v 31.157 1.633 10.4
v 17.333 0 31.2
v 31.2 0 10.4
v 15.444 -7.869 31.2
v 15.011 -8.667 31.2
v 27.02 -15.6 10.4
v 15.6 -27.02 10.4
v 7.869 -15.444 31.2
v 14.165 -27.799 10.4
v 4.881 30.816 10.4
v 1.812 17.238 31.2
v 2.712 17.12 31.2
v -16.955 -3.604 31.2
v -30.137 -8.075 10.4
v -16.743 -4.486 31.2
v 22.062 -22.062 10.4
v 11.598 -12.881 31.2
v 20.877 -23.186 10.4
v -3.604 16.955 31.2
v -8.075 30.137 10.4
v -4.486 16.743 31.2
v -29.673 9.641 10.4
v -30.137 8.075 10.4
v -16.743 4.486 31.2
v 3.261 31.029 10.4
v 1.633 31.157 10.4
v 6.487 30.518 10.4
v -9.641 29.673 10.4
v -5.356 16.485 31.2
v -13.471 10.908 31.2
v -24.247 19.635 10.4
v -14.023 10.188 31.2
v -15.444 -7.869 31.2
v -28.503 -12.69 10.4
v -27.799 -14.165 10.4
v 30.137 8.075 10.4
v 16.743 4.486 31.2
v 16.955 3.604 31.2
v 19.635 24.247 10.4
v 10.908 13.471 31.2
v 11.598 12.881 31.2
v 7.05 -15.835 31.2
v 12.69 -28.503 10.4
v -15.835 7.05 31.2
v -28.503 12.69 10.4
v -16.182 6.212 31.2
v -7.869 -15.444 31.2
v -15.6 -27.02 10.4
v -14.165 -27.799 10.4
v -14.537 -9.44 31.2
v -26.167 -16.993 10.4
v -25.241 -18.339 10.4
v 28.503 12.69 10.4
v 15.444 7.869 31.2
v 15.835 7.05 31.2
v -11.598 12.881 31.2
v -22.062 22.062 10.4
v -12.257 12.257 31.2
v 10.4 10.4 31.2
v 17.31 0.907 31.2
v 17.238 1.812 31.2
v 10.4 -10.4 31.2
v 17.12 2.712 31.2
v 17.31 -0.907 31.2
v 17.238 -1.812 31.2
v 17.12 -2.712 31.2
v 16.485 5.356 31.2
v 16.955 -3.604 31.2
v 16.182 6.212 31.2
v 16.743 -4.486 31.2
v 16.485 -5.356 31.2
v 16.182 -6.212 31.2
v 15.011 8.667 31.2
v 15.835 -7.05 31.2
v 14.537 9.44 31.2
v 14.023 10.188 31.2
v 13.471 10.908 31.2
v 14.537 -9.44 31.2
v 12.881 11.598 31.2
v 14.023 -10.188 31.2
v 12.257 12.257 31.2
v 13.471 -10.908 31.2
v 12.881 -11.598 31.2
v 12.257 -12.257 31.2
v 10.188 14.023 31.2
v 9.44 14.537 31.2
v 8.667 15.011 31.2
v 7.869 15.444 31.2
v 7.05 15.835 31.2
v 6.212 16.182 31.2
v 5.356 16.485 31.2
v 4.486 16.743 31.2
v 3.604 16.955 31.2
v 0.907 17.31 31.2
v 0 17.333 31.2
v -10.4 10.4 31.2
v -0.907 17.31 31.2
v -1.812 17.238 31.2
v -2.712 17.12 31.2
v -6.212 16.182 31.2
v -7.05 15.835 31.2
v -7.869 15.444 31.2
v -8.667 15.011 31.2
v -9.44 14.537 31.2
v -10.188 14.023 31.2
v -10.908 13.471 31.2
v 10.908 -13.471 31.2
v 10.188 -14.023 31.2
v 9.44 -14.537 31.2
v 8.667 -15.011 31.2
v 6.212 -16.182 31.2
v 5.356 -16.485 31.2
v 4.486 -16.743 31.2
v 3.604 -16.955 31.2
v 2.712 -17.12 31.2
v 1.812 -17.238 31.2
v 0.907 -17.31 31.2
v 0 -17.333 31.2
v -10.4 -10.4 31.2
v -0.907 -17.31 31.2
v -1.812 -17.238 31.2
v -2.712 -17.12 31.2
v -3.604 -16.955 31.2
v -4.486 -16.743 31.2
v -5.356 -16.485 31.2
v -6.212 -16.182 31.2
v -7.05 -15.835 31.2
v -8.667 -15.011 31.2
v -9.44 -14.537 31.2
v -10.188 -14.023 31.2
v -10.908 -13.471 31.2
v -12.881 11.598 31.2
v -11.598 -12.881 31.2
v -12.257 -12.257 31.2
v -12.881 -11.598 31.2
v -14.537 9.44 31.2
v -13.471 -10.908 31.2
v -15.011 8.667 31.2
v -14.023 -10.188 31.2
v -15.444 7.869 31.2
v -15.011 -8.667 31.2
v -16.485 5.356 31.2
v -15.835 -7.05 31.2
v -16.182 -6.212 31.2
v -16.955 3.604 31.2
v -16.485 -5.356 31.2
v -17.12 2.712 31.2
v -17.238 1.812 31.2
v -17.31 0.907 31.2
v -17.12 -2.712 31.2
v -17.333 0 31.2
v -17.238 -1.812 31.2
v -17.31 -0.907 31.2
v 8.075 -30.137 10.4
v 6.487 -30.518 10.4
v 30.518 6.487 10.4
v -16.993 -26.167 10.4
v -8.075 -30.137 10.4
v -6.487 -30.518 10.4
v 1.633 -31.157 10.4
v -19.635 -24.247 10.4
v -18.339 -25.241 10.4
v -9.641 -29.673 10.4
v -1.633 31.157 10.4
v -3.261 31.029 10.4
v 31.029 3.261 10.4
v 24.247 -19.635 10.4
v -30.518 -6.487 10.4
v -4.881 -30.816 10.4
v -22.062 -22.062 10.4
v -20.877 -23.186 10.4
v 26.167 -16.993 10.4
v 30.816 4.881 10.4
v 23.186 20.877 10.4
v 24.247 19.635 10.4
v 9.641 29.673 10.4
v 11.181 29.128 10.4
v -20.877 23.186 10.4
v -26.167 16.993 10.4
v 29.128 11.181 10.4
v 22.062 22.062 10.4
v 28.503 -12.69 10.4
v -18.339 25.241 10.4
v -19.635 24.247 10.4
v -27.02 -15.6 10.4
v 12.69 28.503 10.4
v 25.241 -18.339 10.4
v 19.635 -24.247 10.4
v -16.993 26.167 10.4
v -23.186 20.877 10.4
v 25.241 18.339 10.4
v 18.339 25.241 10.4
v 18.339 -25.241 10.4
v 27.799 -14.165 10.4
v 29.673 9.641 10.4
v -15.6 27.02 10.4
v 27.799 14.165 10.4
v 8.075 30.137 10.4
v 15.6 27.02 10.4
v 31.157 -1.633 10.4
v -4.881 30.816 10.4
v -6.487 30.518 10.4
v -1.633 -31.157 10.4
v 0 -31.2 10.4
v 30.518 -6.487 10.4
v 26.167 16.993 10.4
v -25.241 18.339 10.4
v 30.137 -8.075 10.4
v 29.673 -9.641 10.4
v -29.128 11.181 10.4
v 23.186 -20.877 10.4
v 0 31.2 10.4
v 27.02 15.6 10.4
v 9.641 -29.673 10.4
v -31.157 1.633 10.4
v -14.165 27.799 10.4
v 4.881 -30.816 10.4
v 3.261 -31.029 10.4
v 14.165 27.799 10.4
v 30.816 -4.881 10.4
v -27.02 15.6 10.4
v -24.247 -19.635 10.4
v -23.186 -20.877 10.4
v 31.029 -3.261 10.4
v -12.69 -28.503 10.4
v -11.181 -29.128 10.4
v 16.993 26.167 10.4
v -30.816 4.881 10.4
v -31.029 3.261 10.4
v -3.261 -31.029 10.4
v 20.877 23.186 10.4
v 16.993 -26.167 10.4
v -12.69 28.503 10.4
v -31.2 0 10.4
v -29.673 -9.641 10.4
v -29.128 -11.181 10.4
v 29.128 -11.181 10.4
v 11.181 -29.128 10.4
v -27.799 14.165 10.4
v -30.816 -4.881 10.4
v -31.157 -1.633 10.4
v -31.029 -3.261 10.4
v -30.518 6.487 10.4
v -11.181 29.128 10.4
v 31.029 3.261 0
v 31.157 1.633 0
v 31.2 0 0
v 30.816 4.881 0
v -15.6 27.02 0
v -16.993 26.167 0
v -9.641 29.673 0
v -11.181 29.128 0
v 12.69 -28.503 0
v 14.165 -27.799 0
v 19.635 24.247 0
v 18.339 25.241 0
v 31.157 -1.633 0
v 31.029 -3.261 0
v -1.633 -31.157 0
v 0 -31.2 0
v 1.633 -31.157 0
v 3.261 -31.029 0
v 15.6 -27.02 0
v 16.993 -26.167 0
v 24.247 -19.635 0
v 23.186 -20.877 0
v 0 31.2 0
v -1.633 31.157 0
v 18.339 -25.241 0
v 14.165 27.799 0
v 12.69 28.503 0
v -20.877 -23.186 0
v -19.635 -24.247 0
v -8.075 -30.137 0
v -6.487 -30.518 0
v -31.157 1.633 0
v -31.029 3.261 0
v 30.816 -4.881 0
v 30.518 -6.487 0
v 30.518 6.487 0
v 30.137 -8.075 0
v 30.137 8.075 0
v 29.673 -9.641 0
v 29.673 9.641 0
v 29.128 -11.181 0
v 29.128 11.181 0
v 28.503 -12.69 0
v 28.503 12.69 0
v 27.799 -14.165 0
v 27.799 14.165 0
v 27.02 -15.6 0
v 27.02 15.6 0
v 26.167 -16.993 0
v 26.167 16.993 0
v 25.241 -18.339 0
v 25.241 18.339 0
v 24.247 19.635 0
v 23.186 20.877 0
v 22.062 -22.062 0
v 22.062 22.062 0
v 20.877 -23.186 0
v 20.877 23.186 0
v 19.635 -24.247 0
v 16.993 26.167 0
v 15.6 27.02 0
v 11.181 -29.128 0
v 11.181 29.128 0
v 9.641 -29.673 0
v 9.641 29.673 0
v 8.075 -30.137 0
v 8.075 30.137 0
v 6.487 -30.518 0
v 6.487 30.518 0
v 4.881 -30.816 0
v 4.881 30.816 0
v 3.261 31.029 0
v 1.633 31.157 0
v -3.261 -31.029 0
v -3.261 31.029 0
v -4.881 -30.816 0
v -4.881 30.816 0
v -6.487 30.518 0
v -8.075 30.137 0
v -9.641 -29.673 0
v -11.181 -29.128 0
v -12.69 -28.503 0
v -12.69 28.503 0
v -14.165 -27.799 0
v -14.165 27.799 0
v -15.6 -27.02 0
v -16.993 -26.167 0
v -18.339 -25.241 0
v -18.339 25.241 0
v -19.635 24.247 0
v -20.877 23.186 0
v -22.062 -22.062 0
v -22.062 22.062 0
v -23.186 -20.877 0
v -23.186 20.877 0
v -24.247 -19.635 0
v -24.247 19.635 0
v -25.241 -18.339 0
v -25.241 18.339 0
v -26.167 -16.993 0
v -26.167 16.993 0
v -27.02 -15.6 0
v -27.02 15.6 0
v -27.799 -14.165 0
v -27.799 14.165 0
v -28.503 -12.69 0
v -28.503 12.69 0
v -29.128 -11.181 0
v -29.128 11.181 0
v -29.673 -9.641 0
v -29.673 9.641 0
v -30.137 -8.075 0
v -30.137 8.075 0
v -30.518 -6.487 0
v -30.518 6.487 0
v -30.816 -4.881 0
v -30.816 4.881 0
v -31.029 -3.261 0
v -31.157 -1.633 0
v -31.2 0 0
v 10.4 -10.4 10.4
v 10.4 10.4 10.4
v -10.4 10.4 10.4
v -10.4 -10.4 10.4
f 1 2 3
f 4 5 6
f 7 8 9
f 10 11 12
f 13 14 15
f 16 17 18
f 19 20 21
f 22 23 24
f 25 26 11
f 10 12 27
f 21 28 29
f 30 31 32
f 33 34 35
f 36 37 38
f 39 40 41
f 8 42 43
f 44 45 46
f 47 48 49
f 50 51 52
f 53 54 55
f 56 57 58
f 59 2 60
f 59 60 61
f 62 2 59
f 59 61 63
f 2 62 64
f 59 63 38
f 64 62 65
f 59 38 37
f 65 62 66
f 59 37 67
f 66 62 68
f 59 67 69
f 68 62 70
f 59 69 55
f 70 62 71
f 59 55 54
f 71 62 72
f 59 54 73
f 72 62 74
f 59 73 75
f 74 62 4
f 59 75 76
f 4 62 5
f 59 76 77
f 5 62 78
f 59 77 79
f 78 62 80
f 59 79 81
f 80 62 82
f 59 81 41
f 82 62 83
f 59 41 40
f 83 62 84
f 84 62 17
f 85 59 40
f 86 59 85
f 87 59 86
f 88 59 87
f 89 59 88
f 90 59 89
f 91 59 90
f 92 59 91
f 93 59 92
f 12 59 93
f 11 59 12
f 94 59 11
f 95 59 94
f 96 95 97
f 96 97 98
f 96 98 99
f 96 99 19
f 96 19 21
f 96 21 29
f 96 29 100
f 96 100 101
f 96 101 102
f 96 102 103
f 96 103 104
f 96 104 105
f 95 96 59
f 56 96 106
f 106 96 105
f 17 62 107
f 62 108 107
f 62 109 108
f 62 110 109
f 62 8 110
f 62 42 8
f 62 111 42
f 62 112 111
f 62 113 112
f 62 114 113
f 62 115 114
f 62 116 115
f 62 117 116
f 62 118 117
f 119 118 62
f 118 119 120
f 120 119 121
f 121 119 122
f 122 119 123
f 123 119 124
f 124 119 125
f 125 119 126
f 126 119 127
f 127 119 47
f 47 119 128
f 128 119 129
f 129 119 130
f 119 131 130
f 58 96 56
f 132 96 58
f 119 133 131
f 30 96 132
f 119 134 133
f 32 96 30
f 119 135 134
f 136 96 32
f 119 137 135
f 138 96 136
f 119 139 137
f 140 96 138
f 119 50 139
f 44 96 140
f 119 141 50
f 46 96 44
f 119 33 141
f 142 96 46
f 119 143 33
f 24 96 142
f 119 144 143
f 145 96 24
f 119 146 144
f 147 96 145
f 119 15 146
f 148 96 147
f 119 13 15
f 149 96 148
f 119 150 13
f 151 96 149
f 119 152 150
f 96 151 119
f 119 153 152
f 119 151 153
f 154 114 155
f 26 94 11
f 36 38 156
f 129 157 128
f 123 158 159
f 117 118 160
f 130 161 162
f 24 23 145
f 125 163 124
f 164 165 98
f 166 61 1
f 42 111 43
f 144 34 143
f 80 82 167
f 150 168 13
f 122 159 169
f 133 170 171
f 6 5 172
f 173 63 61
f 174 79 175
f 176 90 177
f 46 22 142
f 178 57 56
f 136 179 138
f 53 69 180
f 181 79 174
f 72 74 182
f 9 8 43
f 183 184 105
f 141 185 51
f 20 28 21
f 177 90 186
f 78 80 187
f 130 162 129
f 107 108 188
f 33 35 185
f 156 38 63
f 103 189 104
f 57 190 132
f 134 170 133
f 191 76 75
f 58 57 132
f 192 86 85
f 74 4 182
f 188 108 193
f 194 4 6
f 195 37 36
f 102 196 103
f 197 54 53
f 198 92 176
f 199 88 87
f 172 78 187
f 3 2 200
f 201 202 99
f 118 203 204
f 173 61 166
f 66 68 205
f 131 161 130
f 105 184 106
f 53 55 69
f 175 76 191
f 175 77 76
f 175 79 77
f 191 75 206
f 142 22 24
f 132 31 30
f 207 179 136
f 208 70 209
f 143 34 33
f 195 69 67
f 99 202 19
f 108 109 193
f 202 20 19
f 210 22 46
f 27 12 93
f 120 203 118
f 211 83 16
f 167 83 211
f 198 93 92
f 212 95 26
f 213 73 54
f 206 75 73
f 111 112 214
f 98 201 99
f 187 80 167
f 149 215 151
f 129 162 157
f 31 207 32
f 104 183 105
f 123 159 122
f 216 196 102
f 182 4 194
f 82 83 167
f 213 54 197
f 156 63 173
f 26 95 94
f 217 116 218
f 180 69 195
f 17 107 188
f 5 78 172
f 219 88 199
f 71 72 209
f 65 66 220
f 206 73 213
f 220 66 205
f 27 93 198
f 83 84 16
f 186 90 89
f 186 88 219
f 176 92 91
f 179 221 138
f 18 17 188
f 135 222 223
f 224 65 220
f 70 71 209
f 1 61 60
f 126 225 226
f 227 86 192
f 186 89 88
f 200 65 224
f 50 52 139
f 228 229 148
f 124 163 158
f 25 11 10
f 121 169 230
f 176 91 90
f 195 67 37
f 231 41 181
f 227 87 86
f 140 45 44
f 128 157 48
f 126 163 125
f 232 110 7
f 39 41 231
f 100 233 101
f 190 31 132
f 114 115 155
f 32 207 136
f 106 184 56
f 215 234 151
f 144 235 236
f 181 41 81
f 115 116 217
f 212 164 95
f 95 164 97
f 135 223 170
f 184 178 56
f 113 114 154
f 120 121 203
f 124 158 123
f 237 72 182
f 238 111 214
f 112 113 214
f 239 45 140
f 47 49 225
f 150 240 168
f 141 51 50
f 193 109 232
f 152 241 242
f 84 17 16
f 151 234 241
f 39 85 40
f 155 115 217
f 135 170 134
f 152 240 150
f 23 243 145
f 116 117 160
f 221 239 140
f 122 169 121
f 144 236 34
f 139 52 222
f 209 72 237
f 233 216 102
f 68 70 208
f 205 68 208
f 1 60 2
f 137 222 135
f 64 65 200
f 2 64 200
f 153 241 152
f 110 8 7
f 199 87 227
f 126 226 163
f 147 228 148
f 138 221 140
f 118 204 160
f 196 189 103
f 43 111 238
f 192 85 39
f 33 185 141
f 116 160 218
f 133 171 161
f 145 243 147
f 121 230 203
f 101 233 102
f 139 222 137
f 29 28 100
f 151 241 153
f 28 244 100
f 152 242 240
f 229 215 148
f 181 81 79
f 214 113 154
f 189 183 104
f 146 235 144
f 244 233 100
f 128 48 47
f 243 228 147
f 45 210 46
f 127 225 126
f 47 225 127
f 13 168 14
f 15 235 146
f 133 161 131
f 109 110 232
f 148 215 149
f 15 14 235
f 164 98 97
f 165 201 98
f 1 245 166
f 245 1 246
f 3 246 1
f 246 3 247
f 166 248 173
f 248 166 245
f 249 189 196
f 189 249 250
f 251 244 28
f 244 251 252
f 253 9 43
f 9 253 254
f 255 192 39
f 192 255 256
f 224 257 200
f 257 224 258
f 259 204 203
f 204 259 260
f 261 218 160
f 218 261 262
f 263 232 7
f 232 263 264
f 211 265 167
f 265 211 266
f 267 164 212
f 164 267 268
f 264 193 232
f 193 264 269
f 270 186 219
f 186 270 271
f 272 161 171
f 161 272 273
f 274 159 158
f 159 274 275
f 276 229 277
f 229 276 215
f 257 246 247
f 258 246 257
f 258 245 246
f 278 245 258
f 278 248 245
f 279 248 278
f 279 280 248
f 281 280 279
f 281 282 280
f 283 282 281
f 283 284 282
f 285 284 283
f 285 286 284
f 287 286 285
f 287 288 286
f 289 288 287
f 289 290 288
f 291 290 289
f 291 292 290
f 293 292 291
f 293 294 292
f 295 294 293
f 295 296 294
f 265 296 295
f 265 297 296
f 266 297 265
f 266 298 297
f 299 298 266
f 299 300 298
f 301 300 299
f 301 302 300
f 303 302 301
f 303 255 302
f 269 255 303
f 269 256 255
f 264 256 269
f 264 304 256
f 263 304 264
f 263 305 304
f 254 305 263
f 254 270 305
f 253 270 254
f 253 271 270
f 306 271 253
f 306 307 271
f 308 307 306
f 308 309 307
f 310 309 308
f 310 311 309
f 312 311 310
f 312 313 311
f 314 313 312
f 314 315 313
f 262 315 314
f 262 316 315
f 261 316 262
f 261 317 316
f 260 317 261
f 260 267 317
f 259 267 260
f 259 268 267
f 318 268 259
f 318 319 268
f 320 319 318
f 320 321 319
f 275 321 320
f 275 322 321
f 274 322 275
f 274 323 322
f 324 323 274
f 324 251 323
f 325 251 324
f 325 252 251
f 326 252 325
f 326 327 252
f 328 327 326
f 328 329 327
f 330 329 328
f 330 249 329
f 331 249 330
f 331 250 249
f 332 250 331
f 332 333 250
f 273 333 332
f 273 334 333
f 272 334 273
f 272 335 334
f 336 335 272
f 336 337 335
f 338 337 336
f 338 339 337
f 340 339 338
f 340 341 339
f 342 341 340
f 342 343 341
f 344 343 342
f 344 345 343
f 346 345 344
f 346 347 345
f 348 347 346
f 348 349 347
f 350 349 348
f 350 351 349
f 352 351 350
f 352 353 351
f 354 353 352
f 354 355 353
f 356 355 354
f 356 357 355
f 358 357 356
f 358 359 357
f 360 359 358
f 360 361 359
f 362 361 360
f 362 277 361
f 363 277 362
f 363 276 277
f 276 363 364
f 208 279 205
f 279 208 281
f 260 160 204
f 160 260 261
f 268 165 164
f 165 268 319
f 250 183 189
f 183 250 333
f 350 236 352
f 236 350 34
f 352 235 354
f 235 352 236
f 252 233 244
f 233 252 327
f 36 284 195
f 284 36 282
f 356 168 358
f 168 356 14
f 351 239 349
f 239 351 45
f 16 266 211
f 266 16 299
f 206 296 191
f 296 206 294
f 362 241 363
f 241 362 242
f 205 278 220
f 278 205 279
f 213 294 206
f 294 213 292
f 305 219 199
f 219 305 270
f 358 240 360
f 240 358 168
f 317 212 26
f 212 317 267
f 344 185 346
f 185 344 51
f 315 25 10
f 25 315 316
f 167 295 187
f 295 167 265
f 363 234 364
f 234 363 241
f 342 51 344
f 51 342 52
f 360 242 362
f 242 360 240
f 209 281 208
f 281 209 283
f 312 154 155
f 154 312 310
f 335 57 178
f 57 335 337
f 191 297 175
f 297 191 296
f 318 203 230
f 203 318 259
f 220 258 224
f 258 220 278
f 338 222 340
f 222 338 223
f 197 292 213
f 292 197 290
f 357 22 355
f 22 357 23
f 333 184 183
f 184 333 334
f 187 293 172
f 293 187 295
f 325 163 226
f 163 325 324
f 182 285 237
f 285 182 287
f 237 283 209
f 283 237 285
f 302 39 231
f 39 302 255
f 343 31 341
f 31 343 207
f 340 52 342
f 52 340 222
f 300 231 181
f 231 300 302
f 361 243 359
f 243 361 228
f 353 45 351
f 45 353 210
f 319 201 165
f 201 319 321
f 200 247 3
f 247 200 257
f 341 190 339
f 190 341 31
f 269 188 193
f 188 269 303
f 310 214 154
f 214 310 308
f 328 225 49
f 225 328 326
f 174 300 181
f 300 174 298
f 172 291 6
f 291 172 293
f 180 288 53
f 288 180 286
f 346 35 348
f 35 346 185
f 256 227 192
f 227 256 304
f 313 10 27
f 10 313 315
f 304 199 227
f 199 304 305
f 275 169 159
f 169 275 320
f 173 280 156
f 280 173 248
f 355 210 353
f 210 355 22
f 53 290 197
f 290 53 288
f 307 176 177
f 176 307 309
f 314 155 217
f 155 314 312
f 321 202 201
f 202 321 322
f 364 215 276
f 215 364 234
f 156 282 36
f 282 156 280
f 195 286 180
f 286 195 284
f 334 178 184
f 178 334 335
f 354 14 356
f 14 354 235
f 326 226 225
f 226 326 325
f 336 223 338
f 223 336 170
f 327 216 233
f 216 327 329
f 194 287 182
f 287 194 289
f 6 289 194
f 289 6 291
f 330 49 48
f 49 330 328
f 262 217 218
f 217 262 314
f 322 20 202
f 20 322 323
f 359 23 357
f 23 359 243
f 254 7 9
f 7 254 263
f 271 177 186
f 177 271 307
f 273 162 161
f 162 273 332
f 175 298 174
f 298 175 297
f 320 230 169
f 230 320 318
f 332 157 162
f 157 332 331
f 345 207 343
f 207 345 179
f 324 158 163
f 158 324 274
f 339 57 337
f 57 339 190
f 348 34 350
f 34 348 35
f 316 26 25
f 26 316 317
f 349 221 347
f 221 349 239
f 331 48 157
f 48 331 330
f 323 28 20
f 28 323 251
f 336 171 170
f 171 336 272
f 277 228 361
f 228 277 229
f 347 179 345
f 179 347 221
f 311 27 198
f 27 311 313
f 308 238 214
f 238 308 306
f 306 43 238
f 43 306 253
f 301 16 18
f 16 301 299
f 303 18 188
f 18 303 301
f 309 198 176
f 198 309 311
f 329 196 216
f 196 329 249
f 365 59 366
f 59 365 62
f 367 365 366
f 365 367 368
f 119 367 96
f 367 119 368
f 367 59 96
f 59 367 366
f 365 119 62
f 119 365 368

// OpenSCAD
Taille_du_carre_en_mm  = 20 ;
Resolution = 120 ;

$fn= Resolution ;

carree = Taille_du_carre_en_mm * 1.04 ; //arc compensation  

difference() {

                union(){

                         translate ([0,0,carree/2 ])cylinder (r1=carree * 1.5  , r2= carree /1.2 , h=carree ) ; 
 
                          cylinder(r1=carree * 1.5 , r2=carree * 1.5 , h= carree / 2 );
                        }


           translate ([- carree / 2 , - carree / 2,carree/2])cube([carree,carree,carree * 10]) ;


}
